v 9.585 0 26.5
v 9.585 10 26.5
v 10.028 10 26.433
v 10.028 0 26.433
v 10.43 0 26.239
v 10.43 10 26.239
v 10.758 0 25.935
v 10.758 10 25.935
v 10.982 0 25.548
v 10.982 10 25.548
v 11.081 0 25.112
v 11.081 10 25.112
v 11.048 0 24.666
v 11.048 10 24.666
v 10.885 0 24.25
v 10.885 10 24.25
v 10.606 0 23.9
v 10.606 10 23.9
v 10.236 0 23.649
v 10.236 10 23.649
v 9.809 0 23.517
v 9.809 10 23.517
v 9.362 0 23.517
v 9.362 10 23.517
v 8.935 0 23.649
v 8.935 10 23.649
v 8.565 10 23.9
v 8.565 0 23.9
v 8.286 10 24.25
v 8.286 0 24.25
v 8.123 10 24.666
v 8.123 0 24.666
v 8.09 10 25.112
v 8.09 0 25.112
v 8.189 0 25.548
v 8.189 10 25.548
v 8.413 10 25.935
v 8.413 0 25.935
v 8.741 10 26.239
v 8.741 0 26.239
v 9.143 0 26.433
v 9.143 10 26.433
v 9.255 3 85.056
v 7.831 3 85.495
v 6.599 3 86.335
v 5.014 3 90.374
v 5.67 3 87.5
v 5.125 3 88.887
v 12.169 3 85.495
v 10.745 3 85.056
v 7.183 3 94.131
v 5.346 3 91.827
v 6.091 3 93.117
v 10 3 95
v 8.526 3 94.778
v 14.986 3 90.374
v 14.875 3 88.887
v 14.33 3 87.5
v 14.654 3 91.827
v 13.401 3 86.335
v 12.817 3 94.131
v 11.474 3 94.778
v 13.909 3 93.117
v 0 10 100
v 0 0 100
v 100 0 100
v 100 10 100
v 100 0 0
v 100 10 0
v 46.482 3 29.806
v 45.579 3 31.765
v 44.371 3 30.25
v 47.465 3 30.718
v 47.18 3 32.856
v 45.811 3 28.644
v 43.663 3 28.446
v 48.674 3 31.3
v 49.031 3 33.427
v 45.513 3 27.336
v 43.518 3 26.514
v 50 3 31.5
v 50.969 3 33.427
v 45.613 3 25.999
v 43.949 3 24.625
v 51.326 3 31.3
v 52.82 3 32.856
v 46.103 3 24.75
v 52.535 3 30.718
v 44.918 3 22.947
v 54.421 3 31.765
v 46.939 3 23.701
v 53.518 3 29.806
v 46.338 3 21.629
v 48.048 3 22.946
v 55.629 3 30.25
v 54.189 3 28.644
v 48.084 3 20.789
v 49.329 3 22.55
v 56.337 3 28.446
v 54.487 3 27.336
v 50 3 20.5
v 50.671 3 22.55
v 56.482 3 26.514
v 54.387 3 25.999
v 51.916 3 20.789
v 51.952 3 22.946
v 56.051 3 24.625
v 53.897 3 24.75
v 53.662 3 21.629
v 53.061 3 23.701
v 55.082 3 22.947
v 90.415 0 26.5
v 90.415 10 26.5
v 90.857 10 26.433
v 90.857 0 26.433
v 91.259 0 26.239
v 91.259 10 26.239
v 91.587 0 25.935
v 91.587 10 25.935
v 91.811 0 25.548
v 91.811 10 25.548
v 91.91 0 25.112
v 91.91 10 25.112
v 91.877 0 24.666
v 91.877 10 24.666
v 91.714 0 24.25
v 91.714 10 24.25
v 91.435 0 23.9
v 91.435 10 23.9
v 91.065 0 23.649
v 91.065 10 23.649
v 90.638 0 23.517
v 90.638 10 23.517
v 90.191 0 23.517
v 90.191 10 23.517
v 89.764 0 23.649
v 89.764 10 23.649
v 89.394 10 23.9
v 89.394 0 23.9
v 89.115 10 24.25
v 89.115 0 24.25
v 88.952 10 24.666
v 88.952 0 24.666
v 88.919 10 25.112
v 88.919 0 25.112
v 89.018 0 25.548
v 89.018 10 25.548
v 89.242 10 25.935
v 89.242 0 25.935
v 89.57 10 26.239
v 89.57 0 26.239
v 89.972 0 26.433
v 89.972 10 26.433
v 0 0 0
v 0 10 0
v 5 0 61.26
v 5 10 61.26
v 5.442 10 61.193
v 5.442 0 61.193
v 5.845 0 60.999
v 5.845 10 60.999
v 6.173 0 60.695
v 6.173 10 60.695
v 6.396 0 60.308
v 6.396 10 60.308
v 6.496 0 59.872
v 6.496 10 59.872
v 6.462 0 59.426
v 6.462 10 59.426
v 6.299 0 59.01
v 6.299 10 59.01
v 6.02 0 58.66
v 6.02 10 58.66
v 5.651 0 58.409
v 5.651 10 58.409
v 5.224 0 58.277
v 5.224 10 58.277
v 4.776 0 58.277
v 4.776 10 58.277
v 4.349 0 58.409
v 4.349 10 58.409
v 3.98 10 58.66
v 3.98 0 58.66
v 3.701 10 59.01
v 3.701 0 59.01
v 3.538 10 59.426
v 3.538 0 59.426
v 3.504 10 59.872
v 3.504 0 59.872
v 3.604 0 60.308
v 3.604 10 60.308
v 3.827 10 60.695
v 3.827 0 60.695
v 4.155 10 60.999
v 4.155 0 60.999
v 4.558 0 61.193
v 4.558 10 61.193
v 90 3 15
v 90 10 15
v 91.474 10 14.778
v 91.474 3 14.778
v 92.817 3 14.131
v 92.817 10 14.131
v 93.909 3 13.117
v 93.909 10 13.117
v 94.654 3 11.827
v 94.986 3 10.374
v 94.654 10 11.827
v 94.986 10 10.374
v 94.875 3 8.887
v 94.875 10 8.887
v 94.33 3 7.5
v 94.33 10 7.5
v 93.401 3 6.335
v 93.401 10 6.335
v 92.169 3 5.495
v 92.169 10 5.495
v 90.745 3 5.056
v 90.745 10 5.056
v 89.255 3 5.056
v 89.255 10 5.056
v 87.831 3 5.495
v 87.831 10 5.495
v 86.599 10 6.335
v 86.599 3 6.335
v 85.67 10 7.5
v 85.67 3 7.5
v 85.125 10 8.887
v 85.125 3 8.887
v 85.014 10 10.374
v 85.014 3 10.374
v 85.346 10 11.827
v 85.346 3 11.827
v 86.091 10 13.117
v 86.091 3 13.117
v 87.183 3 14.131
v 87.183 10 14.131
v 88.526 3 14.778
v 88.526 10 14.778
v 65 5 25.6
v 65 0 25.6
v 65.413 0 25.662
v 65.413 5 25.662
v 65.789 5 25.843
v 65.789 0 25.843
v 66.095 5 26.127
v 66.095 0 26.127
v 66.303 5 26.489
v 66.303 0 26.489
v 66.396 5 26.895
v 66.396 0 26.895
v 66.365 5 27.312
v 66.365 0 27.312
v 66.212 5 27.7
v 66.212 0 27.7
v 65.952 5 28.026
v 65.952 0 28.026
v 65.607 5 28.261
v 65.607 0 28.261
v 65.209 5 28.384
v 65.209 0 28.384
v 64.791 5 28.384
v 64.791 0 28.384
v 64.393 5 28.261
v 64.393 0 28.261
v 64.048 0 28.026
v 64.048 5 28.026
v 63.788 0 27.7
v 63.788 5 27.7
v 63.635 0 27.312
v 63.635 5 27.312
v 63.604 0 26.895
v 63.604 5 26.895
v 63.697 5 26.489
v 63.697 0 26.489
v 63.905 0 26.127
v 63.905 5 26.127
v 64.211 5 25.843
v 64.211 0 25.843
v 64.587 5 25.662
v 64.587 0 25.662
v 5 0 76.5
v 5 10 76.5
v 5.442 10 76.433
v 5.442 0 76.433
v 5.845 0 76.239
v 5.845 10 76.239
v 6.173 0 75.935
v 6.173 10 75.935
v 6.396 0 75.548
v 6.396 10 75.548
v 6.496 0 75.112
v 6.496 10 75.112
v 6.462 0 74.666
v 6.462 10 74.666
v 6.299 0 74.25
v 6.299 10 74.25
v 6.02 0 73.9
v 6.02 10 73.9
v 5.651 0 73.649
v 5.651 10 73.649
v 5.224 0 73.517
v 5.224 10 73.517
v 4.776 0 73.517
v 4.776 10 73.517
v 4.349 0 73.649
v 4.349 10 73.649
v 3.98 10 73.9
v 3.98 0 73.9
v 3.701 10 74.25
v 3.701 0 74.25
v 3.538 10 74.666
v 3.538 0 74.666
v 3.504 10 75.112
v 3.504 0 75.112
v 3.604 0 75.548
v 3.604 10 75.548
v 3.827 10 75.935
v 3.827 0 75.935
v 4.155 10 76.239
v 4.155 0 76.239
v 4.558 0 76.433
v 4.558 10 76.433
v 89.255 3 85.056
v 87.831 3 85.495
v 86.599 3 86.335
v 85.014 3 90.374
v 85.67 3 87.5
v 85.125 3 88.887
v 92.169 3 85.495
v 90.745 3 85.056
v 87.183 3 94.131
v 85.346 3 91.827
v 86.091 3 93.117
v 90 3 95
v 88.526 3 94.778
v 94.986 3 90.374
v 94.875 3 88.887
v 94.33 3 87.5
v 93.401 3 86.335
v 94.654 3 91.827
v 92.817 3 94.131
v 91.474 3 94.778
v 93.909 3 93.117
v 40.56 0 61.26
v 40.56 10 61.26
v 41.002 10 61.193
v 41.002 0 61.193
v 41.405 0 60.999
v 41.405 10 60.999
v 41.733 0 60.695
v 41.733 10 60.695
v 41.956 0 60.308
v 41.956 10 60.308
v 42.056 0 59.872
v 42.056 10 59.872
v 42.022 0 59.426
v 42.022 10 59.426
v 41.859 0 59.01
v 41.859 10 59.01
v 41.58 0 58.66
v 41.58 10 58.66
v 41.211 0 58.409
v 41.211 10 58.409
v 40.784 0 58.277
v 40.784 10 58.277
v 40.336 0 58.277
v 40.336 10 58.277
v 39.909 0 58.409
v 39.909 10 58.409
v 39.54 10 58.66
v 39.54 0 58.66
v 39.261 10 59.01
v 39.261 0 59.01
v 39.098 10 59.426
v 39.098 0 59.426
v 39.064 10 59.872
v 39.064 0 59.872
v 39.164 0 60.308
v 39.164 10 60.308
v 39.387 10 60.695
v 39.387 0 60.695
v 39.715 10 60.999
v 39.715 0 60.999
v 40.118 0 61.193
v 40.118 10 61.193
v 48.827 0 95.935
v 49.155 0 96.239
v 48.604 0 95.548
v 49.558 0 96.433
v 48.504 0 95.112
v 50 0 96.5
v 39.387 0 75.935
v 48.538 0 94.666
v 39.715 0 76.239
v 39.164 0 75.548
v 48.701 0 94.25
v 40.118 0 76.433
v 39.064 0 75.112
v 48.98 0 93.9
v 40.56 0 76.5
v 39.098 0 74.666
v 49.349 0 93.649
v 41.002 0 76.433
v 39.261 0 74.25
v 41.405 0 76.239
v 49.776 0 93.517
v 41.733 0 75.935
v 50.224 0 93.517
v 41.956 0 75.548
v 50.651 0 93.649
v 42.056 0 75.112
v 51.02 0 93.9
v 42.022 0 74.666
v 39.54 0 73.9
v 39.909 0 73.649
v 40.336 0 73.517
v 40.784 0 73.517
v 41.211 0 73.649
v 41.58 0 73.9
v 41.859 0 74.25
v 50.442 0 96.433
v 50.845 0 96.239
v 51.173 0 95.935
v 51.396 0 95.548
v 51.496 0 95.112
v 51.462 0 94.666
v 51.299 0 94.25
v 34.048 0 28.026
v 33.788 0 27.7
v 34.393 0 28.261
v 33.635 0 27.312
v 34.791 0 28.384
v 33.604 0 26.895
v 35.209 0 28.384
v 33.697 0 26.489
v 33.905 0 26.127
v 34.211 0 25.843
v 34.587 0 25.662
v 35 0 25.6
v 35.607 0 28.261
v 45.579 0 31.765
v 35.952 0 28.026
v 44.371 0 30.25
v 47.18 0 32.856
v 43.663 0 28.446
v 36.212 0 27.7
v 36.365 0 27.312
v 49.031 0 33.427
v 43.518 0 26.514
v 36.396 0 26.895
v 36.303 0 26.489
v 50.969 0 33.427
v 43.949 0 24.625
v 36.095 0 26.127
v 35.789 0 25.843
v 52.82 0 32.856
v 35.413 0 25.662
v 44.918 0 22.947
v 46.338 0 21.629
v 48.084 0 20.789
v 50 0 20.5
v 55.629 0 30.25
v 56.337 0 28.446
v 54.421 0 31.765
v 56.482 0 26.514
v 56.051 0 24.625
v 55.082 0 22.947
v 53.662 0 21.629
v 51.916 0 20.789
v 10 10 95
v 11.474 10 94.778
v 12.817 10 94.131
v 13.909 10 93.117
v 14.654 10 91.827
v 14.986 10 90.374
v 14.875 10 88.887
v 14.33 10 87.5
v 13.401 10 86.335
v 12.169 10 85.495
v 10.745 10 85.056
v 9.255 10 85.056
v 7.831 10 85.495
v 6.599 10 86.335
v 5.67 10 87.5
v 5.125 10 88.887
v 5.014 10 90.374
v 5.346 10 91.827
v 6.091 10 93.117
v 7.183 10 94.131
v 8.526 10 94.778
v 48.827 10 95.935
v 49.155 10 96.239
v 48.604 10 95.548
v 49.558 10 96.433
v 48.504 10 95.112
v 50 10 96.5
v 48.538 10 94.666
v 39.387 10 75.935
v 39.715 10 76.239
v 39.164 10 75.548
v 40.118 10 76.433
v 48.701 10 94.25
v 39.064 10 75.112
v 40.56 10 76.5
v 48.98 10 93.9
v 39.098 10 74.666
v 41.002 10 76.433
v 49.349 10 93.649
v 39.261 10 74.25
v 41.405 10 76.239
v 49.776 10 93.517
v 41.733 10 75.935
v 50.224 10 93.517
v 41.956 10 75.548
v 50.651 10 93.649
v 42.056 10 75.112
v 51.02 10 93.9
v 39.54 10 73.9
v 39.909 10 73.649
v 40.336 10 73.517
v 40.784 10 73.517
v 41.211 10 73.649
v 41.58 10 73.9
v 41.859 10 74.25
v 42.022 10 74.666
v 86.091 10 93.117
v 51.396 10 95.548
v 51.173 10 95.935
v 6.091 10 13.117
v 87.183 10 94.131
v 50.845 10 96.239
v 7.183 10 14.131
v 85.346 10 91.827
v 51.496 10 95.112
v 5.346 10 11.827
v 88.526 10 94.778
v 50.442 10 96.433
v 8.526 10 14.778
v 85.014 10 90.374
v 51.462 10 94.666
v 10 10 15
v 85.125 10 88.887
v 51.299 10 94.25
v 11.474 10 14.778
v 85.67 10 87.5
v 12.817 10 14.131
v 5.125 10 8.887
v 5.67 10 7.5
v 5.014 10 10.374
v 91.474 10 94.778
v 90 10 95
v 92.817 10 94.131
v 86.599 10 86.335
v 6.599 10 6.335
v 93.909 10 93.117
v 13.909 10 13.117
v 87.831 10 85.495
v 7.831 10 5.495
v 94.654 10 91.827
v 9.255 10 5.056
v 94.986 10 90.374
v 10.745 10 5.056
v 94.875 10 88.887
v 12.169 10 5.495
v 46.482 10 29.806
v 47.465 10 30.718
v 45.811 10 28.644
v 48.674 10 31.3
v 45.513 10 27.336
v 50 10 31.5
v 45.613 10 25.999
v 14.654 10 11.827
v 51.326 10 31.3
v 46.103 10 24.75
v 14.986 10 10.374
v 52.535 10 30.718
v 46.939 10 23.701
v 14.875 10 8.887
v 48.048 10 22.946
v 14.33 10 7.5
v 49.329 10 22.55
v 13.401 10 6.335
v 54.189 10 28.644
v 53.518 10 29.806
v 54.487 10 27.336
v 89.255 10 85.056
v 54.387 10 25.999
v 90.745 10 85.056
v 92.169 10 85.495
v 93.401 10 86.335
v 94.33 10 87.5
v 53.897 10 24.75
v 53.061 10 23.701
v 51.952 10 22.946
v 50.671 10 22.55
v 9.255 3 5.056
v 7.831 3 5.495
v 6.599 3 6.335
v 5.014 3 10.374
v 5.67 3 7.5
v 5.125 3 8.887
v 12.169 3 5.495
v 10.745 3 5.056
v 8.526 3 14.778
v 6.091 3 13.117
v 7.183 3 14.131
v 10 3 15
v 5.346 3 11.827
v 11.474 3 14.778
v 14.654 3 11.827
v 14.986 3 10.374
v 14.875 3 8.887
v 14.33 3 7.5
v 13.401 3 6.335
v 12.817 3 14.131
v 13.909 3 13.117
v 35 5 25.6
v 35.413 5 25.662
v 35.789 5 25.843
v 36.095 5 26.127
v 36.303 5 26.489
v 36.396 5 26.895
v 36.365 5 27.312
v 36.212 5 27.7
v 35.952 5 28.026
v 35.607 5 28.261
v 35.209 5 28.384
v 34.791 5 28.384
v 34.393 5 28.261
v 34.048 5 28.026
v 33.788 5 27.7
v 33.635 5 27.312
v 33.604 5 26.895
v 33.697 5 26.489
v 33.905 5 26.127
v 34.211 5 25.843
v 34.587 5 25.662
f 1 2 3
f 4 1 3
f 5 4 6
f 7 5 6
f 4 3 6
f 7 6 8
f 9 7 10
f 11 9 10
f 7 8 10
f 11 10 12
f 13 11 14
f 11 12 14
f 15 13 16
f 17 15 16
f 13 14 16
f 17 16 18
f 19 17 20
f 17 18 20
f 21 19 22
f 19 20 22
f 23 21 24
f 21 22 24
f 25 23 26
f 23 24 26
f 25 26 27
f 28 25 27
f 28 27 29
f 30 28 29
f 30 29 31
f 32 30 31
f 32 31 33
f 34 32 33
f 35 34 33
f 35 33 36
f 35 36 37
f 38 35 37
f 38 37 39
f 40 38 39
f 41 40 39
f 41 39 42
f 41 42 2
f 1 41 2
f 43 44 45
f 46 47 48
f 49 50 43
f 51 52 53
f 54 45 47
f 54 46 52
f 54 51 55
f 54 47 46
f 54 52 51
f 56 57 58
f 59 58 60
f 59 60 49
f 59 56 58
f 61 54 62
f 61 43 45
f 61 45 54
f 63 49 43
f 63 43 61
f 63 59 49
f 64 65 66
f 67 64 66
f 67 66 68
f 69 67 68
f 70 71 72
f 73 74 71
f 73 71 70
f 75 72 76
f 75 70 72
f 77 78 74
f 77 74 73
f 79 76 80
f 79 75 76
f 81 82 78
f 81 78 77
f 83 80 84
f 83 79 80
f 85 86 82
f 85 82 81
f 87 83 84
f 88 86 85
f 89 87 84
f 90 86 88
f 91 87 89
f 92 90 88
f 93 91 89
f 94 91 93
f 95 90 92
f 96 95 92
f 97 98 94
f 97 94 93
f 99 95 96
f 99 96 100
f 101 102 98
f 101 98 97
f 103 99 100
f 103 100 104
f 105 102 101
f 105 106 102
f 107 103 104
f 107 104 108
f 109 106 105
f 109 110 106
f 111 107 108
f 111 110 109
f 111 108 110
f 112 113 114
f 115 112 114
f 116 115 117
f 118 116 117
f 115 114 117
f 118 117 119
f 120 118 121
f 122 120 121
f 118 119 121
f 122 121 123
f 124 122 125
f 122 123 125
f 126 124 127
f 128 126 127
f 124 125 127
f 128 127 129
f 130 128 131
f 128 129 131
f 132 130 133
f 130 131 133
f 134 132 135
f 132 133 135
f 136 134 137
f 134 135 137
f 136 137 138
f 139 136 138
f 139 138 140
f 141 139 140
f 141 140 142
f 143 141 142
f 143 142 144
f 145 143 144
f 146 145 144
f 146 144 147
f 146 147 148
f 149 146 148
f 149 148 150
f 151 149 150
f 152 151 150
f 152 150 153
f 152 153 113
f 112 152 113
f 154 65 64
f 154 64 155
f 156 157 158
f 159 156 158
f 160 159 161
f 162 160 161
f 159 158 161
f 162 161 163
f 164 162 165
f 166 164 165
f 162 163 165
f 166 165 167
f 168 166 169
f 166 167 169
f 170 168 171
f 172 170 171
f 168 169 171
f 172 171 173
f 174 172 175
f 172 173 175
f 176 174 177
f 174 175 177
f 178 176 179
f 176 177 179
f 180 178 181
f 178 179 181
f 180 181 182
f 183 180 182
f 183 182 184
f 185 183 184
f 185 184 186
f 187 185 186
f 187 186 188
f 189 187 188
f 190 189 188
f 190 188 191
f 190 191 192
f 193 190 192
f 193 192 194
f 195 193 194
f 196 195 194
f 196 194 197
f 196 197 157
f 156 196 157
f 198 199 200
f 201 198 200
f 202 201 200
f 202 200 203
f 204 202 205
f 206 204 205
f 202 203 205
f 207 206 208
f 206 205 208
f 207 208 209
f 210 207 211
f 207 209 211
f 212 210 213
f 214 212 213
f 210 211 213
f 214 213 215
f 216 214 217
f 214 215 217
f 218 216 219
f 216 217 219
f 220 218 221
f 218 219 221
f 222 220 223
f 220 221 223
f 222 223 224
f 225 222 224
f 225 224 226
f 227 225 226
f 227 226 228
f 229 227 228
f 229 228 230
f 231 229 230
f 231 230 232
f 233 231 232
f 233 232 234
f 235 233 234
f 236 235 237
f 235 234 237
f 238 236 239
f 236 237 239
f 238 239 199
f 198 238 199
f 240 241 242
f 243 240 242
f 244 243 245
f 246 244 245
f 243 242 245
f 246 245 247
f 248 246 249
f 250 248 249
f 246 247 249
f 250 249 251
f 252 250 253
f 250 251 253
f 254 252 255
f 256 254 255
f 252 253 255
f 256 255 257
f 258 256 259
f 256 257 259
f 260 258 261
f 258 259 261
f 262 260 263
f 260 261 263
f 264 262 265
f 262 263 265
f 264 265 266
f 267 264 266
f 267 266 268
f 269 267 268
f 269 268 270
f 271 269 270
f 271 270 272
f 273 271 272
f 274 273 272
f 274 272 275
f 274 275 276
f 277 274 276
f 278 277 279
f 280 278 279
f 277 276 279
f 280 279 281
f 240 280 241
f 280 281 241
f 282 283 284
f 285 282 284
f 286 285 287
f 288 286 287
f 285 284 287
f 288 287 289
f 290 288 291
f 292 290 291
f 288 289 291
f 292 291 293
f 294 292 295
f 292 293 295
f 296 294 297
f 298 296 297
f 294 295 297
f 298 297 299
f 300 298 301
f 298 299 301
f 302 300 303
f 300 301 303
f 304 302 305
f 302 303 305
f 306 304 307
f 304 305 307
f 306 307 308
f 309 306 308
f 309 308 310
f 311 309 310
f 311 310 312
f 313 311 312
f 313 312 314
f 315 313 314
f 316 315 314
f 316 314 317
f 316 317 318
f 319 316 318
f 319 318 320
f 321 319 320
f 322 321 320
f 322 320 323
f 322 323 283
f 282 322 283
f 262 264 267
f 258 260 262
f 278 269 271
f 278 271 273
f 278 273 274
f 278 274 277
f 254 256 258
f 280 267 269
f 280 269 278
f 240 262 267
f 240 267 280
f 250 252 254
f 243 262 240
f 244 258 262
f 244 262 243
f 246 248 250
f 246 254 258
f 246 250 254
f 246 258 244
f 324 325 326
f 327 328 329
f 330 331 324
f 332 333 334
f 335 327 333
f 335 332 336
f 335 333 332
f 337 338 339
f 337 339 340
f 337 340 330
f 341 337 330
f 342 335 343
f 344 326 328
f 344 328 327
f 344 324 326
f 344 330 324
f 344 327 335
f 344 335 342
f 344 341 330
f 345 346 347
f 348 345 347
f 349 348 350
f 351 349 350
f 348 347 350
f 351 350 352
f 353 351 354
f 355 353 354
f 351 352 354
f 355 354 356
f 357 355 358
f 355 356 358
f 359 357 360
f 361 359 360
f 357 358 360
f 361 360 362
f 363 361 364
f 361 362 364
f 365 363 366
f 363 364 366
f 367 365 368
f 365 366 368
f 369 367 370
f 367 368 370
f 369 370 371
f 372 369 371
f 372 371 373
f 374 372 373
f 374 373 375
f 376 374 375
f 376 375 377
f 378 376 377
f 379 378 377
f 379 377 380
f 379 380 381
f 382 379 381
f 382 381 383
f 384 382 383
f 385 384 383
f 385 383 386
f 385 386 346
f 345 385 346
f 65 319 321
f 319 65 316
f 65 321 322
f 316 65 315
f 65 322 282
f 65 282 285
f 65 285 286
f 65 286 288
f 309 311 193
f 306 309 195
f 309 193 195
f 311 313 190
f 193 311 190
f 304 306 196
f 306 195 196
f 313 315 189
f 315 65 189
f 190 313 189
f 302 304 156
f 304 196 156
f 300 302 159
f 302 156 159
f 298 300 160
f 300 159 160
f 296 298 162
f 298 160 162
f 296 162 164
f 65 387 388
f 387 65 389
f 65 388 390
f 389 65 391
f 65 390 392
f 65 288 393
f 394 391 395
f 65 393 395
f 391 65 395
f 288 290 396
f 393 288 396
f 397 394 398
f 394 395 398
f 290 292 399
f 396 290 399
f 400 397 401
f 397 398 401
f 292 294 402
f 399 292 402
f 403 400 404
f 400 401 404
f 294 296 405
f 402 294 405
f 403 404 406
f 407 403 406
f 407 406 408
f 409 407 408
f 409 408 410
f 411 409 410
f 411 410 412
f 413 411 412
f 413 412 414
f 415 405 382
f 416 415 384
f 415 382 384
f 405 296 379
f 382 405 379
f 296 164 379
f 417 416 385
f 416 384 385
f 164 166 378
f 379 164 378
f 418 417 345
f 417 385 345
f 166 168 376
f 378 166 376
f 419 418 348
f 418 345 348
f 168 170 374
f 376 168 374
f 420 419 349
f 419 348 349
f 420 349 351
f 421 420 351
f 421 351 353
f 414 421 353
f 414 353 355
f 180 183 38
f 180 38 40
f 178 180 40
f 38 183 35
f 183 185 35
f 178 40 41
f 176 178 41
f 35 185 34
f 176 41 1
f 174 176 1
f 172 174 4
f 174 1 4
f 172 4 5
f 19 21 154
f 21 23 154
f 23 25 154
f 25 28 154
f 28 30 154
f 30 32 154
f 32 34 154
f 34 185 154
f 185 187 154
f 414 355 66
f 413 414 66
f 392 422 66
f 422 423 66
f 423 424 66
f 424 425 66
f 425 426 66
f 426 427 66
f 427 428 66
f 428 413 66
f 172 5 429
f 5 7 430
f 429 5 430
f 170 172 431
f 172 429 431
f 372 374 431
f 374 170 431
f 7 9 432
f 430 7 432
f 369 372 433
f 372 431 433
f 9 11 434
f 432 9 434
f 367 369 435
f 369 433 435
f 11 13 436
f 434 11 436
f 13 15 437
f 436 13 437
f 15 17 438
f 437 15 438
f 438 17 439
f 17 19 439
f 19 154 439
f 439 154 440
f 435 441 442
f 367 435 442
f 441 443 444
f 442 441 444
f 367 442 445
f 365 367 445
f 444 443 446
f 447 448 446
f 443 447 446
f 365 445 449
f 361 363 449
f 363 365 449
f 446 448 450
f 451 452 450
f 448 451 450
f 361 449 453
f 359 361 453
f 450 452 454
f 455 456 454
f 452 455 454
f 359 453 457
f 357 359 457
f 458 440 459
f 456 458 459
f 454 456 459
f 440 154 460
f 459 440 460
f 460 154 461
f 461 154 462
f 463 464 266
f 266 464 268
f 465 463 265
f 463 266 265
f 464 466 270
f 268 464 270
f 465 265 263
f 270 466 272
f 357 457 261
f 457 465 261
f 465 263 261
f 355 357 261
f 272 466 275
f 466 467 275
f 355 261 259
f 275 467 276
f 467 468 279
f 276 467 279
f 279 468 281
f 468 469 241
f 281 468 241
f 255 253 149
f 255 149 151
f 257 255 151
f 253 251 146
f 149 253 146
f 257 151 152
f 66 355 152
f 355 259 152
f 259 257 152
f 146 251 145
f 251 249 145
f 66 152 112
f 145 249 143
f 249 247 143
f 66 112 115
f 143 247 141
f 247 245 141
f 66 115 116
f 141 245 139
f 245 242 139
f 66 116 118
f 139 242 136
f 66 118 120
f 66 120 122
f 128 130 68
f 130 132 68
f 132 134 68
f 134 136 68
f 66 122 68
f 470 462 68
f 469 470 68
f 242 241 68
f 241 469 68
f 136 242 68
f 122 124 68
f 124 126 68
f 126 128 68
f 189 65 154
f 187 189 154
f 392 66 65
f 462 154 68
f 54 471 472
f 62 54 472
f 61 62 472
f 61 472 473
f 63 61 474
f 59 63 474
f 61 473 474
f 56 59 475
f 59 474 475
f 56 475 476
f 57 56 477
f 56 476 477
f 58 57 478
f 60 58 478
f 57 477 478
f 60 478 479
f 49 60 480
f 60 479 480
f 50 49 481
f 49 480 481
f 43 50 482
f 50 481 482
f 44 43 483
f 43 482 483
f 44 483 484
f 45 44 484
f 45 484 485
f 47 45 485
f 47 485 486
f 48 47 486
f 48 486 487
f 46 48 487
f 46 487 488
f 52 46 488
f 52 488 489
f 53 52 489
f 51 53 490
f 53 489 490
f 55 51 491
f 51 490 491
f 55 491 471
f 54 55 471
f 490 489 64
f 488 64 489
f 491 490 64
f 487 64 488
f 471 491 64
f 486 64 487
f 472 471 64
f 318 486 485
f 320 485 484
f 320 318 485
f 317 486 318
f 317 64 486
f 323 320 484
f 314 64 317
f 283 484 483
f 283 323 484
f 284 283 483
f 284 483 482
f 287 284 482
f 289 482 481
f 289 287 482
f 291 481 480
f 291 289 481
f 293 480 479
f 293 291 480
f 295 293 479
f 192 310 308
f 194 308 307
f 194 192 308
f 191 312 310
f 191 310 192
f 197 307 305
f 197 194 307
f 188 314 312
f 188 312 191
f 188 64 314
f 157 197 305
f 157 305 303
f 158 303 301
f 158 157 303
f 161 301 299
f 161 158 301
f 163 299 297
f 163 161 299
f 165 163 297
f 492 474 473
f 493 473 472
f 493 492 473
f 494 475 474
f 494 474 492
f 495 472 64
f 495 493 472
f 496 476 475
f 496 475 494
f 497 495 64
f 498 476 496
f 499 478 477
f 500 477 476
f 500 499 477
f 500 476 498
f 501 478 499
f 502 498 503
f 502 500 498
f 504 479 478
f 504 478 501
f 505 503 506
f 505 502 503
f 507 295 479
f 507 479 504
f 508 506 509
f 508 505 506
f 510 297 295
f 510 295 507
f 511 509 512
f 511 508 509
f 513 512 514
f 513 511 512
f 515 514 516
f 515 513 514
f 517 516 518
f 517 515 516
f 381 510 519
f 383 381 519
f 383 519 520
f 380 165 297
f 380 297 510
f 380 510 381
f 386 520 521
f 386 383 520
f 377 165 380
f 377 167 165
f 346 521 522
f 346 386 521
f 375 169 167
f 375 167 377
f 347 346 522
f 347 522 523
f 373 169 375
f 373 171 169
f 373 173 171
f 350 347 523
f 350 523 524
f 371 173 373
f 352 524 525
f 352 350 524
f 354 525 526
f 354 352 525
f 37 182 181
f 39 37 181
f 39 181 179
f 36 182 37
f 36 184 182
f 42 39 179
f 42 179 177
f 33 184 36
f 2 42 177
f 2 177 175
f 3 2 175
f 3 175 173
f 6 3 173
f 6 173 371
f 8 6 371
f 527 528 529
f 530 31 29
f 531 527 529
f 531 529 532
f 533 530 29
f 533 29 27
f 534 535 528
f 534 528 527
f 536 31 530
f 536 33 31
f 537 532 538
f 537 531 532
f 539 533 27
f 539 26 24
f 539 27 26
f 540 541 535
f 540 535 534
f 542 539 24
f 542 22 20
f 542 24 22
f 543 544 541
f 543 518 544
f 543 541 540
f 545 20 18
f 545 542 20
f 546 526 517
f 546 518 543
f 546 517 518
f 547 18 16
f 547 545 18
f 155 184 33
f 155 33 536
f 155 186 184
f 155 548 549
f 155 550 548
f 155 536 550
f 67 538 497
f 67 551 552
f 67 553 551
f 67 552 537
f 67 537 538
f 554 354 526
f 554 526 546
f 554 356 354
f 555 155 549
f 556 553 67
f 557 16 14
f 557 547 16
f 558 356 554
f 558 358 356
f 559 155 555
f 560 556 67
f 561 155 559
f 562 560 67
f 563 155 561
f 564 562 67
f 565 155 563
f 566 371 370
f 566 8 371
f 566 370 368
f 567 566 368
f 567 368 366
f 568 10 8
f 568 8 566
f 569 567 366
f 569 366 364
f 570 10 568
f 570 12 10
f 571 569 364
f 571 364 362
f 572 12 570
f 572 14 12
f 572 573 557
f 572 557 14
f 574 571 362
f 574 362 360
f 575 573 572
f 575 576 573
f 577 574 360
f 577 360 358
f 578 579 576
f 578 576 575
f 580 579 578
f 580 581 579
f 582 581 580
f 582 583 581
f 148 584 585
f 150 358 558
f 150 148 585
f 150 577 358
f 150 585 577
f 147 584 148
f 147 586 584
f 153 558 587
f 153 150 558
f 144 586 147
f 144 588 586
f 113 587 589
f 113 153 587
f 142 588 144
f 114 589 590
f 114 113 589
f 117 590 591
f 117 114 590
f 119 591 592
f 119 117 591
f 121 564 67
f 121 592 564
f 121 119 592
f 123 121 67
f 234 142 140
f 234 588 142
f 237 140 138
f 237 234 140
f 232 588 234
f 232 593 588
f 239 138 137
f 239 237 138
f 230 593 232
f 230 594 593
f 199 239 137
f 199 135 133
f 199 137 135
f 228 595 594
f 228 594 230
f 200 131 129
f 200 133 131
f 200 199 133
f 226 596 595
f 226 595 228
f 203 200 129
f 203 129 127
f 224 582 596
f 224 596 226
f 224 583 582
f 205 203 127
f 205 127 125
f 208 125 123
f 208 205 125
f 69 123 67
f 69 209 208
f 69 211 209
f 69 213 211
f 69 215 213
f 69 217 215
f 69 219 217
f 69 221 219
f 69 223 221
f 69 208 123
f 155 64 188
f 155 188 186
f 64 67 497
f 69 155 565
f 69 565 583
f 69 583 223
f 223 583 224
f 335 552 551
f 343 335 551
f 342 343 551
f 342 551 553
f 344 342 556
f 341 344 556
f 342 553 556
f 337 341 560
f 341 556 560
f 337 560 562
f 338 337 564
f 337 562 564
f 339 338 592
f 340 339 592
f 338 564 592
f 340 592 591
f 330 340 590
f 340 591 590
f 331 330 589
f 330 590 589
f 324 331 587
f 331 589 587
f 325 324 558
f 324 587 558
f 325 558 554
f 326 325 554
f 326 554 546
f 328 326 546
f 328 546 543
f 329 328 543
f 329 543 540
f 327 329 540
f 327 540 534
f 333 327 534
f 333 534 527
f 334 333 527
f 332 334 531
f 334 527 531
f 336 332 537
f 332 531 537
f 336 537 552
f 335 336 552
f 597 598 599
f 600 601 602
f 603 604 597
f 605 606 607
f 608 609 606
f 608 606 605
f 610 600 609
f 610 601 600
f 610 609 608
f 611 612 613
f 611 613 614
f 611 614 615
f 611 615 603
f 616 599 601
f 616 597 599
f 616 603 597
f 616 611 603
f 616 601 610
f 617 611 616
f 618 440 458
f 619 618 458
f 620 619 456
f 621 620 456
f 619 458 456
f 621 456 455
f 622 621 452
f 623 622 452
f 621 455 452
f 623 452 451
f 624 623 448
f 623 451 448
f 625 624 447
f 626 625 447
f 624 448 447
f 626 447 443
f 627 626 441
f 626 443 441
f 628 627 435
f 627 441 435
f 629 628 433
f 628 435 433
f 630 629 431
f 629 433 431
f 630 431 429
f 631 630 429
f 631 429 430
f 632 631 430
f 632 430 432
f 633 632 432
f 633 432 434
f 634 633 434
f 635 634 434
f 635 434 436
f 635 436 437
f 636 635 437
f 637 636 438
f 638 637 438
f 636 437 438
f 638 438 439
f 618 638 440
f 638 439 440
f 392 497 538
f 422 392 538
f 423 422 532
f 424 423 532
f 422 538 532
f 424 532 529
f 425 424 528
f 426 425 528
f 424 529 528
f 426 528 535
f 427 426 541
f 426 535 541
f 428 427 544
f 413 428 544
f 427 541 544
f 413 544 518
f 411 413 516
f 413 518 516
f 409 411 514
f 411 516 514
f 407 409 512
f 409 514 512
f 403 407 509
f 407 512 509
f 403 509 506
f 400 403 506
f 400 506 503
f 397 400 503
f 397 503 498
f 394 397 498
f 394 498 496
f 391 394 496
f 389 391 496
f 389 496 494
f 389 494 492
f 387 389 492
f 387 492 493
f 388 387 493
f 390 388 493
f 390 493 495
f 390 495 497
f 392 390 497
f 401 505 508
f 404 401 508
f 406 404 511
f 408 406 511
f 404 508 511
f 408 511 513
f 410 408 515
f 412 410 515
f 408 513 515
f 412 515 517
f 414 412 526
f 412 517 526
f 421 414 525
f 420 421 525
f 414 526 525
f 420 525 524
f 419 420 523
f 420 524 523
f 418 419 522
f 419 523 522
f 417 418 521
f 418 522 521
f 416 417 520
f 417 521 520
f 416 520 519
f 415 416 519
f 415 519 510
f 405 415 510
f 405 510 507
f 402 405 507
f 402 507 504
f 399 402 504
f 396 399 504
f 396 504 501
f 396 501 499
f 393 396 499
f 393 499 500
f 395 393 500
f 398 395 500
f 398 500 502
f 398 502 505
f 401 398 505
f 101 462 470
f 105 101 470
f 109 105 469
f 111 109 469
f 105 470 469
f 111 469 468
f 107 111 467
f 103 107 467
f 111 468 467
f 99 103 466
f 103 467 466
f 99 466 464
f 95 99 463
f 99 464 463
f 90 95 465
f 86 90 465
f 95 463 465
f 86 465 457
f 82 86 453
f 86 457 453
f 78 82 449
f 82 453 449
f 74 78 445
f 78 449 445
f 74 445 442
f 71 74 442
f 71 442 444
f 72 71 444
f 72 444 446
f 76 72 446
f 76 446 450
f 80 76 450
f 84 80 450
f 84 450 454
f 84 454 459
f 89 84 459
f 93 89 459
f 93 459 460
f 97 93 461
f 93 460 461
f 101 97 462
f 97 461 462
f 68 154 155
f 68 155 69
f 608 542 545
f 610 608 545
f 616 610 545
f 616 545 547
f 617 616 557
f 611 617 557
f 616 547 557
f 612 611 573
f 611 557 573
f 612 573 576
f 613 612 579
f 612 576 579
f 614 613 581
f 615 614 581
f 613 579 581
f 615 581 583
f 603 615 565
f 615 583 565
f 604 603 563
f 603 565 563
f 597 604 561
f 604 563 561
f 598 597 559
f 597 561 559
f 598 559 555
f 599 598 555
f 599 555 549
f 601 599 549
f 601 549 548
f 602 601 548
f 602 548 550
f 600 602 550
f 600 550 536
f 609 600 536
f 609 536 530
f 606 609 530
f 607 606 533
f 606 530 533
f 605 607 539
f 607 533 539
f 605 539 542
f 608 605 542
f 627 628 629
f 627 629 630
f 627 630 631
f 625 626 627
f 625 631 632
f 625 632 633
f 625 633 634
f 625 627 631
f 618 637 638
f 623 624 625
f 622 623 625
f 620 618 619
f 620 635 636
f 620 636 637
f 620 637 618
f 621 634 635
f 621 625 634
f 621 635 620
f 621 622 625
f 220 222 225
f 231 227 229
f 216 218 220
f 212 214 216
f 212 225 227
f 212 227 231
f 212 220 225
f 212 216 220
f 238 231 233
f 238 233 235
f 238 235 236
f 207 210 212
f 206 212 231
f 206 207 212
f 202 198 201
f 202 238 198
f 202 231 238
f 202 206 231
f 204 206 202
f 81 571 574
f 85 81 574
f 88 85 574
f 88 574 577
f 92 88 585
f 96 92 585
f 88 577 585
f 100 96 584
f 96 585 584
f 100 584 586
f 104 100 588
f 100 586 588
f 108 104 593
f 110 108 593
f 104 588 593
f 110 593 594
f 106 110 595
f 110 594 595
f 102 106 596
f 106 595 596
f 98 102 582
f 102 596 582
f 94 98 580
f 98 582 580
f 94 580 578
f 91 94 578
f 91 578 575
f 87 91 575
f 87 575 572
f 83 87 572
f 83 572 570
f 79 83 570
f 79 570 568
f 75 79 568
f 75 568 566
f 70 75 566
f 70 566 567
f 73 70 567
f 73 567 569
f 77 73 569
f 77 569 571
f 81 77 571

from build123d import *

# Parameters (mm, degrees)
SKETCH_1_W          = 100
SKETCH_1_H          = 100
EXTRUDE_1_DEPTH     = 10
SKETCH_2_R          = 5
CUT_EXTRUDE_1_DEPTH = 7
SKETCH_3_R          = 1.5
CUT_EXTRUDE_2_DEPTH = 142.774468788
SKETCH_4_R          = 4.5
CUT_EXTRUDE_3_DEPTH = 142.774468788
SKETCH_5_R          = 6.5
CUT_EXTRUDE_4_DEPTH = 3
SKETCH_6_R          = 1.5
CUT_EXTRUDE_5_DEPTH = 142.774468788
SKETCH_7_R          = 1.4
CUT_EXTRUDE_6_DEPTH = 5


with BuildPart() as part:
    # 草图1 → 凸台-拉伸1 (new body)
    with BuildSketch(Plane(origin=(0, 0, 0), x_dir=(1, 0, 0), z_dir=(0, 1, 0))):
        with Locations((50, -50)):
            Rectangle(SKETCH_1_W, SKETCH_1_H)
    extrude(amount=EXTRUDE_1_DEPTH)

    # 草图2 → 切除-拉伸1 (cut)
    with BuildSketch(Plane(origin=(0, 10, 0), x_dir=(1, 0, 0), z_dir=(0, 1, 0))):
        with Locations(Location((10, -10, 0), (0, 0, 270))):
            Circle(SKETCH_2_R)
        with Locations(Location((90, -10, 0), (0, 0, 270))):
            Circle(SKETCH_2_R)
        with Locations(Location((10, -90, 0), (0, 0, 270))):
            Circle(SKETCH_2_R)
        with Locations(Location((90, -90, 0), (0, 0, 270))):
            Circle(SKETCH_2_R)
    extrude(amount=-CUT_EXTRUDE_1_DEPTH, mode=Mode.SUBTRACT)

    # 草图3 → 切除-拉伸2 (cut, through all)
    with BuildSketch(Plane(origin=(0, 10, 0), x_dir=(1, 0, 0), z_dir=(0, 1, 0))):
        with Locations(Location((50, -95, 0), (0, 0, 270))):
            Circle(SKETCH_3_R)
        with Locations(Location((90.414518843, -25, 0), (0, 0, 270))):
            Circle(SKETCH_3_R)
        with Locations(Location((9.585481157, -25, 0), (0, 0, 270))):
            Circle(SKETCH_3_R)
    extrude(amount=-CUT_EXTRUDE_2_DEPTH, mode=Mode.SUBTRACT)

    # 草图4 → 切除-拉伸3 (cut, through all)
    with BuildSketch(Plane(origin=(0, 10, 0), x_dir=(1, 0, 0), z_dir=(0, 1, 0))):
        with Locations(Location((50, -27, 0), (0, 0, 270))):
            Circle(SKETCH_4_R)
    extrude(amount=-CUT_EXTRUDE_3_DEPTH, mode=Mode.SUBTRACT)

    # 草图5 → 切除-拉伸4 (cut)
    with BuildSketch(Plane(origin=(0, 0, 0), x_dir=(-1, 0, 0), z_dir=(0, -1, 0))):
        with Locations(Location((-50, -27, 0), (0, 0, 90))):
            Circle(SKETCH_5_R)
    extrude(amount=-CUT_EXTRUDE_4_DEPTH, mode=Mode.SUBTRACT)

    # 草图6 → 切除-拉伸5 (cut, through all)
    with BuildSketch(Plane(origin=(0, 10, 0), x_dir=(1, 0, 0), z_dir=(0, 1, 0))):
        with Locations(Location((40.56, -59.76, 0), (0, 0, 270))):
            Circle(SKETCH_6_R)
        with Locations(Location((40.56, -75, 0), (0, 0, 270))):
            Circle(SKETCH_6_R)
        with Locations(Location((5, -59.76, 0), (0, 0, 270))):
            Circle(SKETCH_6_R)
        with Locations(Location((5, -75, 0), (0, 0, 270))):
            Circle(SKETCH_6_R)
    extrude(amount=-CUT_EXTRUDE_5_DEPTH, mode=Mode.SUBTRACT)

    # 草图7 → 切除-拉伸6 (cut)
    with BuildSketch(Plane(origin=(0, 0, 0), x_dir=(-1, 0, 0), z_dir=(0, -1, 0))):
        with Locations(Location((-65, -27, 0), (0, 0, 90))):
            Circle(SKETCH_7_R)
        with Locations(Location((-35, -27, 0), (0, 0, 90))):
            Circle(SKETCH_7_R)
    extrude(amount=-CUT_EXTRUDE_6_DEPTH, mode=Mode.SUBTRACT)


solid = part.part
